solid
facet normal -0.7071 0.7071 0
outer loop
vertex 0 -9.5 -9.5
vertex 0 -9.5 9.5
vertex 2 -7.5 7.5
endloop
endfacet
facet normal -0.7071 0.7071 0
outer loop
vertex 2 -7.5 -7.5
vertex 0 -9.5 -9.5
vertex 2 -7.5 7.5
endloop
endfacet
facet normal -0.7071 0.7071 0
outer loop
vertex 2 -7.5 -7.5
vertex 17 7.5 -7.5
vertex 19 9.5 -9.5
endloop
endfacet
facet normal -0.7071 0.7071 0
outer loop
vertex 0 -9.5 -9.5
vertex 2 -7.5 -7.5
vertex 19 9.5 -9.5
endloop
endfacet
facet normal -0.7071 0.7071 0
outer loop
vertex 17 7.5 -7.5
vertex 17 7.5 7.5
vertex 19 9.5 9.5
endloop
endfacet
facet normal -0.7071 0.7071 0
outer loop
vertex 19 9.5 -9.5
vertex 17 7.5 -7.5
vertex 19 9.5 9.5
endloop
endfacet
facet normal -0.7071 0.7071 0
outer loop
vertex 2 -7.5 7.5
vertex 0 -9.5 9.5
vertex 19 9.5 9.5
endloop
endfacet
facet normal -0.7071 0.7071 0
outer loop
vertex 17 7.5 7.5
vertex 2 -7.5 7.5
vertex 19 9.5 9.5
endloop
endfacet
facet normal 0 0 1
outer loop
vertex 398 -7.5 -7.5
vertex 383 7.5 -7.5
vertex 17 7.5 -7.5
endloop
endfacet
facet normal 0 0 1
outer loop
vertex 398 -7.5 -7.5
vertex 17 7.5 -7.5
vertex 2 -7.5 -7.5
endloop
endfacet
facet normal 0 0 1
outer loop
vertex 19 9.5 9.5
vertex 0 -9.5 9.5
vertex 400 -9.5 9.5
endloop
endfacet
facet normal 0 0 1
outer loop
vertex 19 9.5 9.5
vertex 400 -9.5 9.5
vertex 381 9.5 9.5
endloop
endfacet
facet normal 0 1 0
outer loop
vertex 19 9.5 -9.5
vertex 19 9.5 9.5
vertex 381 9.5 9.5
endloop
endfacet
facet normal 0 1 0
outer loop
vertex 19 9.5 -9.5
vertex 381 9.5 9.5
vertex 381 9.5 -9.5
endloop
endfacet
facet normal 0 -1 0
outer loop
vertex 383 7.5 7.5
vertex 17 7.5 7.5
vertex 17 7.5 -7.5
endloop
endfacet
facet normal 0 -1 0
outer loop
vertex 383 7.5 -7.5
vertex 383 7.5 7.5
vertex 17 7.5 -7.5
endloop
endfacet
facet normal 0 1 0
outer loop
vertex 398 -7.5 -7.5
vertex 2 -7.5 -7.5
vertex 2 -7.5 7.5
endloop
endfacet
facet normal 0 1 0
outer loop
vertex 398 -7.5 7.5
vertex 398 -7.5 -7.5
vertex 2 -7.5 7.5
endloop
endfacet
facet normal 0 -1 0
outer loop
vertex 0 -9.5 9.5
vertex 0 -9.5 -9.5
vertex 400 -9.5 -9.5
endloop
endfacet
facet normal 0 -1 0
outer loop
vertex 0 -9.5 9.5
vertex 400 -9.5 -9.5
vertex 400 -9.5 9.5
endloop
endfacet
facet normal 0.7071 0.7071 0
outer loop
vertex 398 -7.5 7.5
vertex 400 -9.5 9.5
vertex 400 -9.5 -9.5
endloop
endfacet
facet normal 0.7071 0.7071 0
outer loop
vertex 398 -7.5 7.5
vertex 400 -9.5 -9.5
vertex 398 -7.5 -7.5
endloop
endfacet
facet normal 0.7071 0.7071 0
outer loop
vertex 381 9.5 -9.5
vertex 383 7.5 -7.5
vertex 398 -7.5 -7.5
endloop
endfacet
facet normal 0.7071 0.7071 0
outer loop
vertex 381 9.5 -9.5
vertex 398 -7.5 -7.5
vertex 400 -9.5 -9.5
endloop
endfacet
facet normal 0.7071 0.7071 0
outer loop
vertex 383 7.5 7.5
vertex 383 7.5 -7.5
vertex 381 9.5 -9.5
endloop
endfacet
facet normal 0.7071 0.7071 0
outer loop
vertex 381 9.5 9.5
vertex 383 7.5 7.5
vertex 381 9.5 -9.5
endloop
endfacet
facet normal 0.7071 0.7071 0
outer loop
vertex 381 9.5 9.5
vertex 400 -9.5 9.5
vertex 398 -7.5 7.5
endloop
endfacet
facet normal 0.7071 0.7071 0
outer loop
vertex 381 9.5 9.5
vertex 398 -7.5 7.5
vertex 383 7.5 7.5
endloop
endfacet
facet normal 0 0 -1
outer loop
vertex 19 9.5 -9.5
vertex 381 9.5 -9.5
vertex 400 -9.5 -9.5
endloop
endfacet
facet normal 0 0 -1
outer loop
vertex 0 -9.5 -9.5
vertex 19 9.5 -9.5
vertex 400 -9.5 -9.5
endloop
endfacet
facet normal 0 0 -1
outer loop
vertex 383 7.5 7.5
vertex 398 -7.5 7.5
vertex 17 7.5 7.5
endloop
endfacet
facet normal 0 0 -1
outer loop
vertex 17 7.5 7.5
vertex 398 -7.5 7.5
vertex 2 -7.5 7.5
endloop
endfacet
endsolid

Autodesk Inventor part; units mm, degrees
ref_plane "YZ Plane" through (0, 0, 0) normal (1, 0, 0) x (0, 1, 0)
ref_plane "XZ Plane" through (0, 0, 0) normal (0, 1, 0) x (-1, 0, 0)
ref_plane "XY Plane" through (0, 0, 0) normal (0, 0, 1) x (1, 0, 0)
sketch "Sketch1" plane through (0, 0, 0) normal (1, 0, 0) x (0, 1, 0)
  line L0 (-9.5, 9.5) -> (9.5, 9.5)
  line L1 (9.5, 9.5) -> (9.5, -9.5)
  line L2 (9.5, -9.5) -> (-9.5, -9.5)
  line L3 (-9.5, -9.5) -> (-9.5, 9.5)
  line L4 (-9.5, 9.5) -> (9.5, -9.5) construction
  line L5 (9.5, 9.5) -> (-9.5, -9.5) construction
  line L6 (-7.5, 7.5) -> (7.5, 7.5)
  line L7 (7.5, 7.5) -> (7.5, -7.5)
  line L8 (7.5, -7.5) -> (-7.5, -7.5)
  line L9 (-7.5, -7.5) -> (-7.5, 7.5)
  line L10 (-7.5, 7.5) -> (7.5, -7.5) construction
  line L11 (7.5, 7.5) -> (-7.5, -7.5) construction
  point P0 (0, 0)
  dimension "d0" = 2
  dimension "d1" = 2
  dimension "d2" = 19
  dimension "d3" = 19
extrude "Extrusion1" add sketch "Sketch1" along normal blind 400
sketch "Sketch2" plane through (0, -9.5, 9.5) normal (0, 0, 1) x (1, 0, 0)
  line L0 (0, 19) -> (0, 0) projected
  line L1 (0, 19) -> (400, 19) projected
  line L2 (400, 19) -> (400, 0) projected
  line L3 (0, 0) -> (400, 0) projected
  line L4 (0, 0) -> (19, 19)
  line L5 (400, 0) -> (381, 19)
  point P0 (0, 9.5)
  dimension "d10" = 45
  dimension "d11" = 45
extrude "Extrusion2" cut sketch "Sketch2" against normal through all contours L1 L4 L0 | L5 L1 L2
equation "\"d1\" = d0"
properties part number "RS2_TubeFoot" material "Steel"
